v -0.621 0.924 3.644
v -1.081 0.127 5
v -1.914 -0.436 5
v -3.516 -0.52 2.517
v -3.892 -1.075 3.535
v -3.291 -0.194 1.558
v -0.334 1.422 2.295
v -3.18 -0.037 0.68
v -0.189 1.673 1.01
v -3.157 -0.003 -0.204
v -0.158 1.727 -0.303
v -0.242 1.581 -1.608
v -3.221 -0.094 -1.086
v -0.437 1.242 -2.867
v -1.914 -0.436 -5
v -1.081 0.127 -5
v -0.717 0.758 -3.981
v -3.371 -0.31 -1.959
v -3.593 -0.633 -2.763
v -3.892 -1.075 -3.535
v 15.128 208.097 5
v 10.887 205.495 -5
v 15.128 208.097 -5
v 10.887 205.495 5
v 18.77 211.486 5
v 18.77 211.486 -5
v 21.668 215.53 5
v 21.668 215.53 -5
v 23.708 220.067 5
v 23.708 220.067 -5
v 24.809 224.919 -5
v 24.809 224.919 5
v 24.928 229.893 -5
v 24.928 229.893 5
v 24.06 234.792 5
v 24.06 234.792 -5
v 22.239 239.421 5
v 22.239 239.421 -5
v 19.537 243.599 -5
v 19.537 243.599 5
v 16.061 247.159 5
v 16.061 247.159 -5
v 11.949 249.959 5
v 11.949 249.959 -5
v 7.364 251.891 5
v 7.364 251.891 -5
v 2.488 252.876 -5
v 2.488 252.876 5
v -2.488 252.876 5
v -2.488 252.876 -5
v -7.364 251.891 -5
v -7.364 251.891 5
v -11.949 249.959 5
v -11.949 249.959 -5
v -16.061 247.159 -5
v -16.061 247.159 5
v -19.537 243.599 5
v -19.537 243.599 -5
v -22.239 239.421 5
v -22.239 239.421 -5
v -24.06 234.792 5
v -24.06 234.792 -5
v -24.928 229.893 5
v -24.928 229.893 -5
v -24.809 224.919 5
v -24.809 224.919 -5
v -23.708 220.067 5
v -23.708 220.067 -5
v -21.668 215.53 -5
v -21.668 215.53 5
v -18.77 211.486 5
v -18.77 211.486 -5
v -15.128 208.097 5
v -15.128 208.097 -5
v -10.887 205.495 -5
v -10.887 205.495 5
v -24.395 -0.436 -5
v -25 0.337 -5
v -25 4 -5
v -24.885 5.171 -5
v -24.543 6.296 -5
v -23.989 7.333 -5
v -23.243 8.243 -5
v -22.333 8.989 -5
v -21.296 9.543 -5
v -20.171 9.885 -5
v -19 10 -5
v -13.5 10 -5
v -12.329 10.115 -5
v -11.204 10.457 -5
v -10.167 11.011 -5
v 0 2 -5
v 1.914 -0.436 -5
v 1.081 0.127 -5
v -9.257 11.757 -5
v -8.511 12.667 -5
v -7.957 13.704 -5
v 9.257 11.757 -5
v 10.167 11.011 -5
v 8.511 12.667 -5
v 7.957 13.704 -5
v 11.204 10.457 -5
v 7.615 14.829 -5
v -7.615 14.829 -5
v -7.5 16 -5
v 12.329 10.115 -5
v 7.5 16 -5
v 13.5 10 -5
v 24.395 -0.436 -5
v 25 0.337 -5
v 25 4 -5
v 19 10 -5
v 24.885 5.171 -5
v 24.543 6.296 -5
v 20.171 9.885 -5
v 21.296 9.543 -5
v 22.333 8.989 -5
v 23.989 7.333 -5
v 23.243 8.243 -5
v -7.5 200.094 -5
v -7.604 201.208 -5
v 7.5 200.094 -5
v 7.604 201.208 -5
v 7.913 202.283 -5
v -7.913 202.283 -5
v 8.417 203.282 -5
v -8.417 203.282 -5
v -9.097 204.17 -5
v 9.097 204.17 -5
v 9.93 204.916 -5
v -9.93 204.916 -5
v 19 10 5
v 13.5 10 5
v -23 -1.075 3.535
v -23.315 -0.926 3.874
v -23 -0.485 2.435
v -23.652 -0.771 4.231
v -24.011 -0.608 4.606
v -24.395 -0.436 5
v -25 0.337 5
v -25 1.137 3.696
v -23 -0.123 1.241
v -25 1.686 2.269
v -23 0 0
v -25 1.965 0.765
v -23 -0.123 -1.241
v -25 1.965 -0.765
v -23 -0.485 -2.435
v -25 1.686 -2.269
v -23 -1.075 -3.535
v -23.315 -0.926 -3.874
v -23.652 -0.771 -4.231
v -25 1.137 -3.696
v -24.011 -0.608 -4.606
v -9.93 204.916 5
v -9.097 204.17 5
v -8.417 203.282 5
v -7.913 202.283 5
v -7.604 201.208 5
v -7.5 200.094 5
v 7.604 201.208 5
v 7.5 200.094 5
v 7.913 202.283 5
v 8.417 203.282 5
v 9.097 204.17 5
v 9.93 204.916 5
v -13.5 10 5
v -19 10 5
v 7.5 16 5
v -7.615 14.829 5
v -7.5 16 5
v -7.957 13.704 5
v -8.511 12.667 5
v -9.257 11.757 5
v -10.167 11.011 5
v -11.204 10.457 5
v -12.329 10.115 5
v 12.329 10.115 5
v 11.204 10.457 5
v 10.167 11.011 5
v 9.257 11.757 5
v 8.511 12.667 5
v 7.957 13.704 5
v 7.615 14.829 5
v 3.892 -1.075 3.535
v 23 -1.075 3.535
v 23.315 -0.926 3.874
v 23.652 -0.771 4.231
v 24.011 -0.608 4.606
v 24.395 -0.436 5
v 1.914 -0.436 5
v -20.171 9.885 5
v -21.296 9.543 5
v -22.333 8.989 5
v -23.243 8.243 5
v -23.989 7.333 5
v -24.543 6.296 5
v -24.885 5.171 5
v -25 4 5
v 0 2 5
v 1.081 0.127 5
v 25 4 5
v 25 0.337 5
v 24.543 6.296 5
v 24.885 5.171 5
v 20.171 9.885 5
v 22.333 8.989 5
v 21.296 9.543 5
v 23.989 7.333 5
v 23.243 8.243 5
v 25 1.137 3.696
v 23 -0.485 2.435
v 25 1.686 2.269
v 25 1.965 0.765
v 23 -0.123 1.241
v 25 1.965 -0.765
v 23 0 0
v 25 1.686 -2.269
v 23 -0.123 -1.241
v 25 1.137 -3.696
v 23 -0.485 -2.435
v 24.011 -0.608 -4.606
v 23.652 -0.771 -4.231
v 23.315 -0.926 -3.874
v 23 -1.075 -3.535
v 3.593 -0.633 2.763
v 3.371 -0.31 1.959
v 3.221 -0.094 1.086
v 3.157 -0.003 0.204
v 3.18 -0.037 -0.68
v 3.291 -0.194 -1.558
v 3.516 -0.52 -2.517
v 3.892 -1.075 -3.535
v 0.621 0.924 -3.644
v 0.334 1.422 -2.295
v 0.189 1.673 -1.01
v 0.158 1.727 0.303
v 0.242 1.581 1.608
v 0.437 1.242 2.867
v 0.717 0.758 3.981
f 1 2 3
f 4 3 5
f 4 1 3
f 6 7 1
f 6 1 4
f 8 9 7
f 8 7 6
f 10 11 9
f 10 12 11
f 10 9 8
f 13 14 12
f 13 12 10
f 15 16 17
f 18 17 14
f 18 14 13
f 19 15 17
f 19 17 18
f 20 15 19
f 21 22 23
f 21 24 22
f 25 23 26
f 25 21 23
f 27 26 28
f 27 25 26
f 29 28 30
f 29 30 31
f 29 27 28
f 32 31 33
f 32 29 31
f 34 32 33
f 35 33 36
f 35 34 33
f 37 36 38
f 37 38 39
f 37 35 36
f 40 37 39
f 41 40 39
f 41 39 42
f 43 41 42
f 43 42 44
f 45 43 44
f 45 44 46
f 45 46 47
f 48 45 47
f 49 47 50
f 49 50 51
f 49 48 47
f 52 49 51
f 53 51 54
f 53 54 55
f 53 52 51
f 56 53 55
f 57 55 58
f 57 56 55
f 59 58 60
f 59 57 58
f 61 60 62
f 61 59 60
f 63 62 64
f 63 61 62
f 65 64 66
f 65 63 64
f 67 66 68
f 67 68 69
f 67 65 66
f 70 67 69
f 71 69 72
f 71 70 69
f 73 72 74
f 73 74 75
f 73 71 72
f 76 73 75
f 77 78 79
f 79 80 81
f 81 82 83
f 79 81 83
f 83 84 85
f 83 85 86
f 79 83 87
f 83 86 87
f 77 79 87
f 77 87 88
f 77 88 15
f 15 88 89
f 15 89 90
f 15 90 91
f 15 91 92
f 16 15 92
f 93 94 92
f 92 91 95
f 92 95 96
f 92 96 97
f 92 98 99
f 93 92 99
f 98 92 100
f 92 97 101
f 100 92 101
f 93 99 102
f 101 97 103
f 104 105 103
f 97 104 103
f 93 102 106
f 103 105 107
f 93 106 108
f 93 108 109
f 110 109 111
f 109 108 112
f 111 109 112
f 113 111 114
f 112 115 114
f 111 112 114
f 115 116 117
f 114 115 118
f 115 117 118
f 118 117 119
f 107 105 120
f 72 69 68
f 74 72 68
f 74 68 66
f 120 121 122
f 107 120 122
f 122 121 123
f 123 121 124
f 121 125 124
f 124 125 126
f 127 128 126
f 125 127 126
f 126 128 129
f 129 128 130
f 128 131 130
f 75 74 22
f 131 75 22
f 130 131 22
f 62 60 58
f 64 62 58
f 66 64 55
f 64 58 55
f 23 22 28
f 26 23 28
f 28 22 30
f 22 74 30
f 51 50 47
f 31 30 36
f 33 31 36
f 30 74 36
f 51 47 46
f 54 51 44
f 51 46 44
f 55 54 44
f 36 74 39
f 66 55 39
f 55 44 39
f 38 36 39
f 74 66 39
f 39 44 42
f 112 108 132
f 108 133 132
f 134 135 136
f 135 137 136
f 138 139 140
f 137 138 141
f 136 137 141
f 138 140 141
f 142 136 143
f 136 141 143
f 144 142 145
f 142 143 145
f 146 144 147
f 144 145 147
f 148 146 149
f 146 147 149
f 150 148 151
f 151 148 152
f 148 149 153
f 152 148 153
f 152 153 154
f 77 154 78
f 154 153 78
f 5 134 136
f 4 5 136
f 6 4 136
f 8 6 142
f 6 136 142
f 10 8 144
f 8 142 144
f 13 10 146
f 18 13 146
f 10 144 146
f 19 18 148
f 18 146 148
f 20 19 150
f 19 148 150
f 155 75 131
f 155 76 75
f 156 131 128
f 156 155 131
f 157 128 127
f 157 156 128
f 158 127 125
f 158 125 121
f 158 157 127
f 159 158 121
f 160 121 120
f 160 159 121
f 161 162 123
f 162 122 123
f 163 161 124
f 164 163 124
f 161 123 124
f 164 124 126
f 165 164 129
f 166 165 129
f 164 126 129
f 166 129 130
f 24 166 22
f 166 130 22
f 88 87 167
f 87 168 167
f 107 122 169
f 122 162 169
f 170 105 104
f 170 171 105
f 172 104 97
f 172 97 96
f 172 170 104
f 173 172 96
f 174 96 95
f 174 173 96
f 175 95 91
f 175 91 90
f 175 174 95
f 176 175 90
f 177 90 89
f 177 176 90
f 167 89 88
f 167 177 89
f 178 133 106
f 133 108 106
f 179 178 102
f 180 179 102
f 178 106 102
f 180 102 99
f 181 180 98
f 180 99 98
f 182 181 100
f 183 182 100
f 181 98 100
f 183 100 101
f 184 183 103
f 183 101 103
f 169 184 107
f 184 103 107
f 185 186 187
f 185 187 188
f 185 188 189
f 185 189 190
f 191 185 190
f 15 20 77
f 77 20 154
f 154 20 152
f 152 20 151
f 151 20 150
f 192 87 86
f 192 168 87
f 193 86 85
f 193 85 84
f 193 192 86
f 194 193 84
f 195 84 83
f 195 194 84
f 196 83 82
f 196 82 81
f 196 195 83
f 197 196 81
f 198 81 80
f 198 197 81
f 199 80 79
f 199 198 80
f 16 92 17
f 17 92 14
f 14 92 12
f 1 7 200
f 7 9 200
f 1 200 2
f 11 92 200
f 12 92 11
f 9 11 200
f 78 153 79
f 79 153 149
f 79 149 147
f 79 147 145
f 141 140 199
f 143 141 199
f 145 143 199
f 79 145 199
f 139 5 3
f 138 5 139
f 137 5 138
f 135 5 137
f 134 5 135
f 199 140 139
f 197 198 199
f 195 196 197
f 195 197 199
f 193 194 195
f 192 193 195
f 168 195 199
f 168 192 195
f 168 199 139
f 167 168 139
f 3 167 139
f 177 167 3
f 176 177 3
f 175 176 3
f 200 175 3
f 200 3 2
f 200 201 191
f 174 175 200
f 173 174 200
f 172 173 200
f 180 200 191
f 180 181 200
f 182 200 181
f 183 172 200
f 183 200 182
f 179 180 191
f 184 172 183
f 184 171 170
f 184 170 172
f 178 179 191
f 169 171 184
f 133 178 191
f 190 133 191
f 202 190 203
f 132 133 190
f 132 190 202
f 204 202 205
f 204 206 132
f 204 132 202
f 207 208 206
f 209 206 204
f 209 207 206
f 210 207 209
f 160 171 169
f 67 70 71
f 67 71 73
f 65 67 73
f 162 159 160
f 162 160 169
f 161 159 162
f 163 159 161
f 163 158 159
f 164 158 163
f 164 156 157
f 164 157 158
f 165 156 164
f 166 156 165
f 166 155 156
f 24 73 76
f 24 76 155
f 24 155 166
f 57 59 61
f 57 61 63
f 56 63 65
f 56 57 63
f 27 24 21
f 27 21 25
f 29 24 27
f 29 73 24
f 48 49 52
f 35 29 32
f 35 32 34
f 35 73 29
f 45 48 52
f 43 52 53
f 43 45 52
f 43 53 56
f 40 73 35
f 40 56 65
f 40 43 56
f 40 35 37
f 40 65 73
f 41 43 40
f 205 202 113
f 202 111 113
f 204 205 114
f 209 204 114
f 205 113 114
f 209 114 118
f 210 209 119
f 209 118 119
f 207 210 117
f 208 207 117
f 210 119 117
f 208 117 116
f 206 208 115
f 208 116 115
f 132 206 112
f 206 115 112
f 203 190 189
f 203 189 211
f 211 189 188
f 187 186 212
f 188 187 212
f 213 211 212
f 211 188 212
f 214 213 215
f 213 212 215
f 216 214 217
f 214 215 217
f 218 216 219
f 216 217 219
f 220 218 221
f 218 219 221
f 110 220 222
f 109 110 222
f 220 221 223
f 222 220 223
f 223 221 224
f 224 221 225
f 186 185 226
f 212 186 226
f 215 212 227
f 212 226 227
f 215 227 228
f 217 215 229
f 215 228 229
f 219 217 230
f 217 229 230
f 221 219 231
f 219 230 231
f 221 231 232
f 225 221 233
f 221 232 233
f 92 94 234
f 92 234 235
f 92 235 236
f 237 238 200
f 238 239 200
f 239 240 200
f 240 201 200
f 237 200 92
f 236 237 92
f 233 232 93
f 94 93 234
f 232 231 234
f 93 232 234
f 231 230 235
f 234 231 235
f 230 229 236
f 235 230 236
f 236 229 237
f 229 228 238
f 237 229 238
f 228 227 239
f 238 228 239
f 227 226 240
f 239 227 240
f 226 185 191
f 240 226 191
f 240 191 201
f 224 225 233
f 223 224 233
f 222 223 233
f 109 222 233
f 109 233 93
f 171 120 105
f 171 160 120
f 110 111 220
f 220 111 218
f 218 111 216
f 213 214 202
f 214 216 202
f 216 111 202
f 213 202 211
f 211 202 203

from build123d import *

# Parameters (mm, degrees)
PAD_DEPTH       = 5
SKETCH001_R     = 6.35
POCKET_DEPTH    = 50.001
POCKET001_DEPTH = 10.001
CHAMFER_SIZE    = 2
FILLET_R        = 6


with BuildPart() as part:
    # Sketch → Pad (new body, symmetric)
    with BuildSketch(Plane.XY):
        with BuildLine():
            ThreePointArc((7.5, 204.15152), (0, 253), (-7.5, 204.15152))
            Line((-7.5, 204.15152), (-7.5, 10))
            Line((-25, 10), (-7.5, 10))
            Line((-25, -5), (-25, 10))
            Line((25, -5), (-25, -5))
            Line((25, 10), (25, -5))
            Line((7.5, 10), (25, 10))
            Line((7.5, 204.15152), (7.5, 10))
        make_face()
    extrude(amount=PAD_DEPTH, both=True)

    # Sketch001 → Pocket (cut, through all)
    with BuildSketch(Plane(origin=(-25, 0, 0), x_dir=(0, -1, 0), z_dir=(-1, 0, 0))):
        with Locations((6.35, 0)):
            Circle(SKETCH001_R)
    extrude(amount=-POCKET_DEPTH, mode=Mode.SUBTRACT)

    # Sketch002 → Pocket001 (cut, through all)
    with BuildSketch(Plane.XY.offset(5)):
        Polygon((0, 2), (-10, -15.320508), (10, -15.320508), align=None)
    extrude(amount=-POCKET001_DEPTH, mode=Mode.SUBTRACT)

    # Chamfer
    chamfer_edges = [part.edges().sort_by_distance(p)[0] for p in [
        (13.780448, -2.435603, 5),
        (-13.780448, -2.435603, 5),
        (-25, 0, 0),
        (-1.154701, 0, 0),
        (1.154701, 0, 0),
        (25, 0, 0),
        (13.780448, -2.435603, -5),
        (-13.780448, -2.435603, -5),
    ]]
    chamfer(chamfer_edges, length=CHAMFER_SIZE)

    # Fillet
    fillet_edges = [part.edges().sort_by_distance(p)[0] for p in [
        (25, 10, 0),
        (7.5, 10, 0),
        (-7.5, 10, 0),
        (-25, 10, 0),
        (7.5, 204.15152, 0),
        (-7.5, 204.15152, 0),
    ]]
    fillet(fillet_edges, radius=FILLET_R)


solid = part.part
